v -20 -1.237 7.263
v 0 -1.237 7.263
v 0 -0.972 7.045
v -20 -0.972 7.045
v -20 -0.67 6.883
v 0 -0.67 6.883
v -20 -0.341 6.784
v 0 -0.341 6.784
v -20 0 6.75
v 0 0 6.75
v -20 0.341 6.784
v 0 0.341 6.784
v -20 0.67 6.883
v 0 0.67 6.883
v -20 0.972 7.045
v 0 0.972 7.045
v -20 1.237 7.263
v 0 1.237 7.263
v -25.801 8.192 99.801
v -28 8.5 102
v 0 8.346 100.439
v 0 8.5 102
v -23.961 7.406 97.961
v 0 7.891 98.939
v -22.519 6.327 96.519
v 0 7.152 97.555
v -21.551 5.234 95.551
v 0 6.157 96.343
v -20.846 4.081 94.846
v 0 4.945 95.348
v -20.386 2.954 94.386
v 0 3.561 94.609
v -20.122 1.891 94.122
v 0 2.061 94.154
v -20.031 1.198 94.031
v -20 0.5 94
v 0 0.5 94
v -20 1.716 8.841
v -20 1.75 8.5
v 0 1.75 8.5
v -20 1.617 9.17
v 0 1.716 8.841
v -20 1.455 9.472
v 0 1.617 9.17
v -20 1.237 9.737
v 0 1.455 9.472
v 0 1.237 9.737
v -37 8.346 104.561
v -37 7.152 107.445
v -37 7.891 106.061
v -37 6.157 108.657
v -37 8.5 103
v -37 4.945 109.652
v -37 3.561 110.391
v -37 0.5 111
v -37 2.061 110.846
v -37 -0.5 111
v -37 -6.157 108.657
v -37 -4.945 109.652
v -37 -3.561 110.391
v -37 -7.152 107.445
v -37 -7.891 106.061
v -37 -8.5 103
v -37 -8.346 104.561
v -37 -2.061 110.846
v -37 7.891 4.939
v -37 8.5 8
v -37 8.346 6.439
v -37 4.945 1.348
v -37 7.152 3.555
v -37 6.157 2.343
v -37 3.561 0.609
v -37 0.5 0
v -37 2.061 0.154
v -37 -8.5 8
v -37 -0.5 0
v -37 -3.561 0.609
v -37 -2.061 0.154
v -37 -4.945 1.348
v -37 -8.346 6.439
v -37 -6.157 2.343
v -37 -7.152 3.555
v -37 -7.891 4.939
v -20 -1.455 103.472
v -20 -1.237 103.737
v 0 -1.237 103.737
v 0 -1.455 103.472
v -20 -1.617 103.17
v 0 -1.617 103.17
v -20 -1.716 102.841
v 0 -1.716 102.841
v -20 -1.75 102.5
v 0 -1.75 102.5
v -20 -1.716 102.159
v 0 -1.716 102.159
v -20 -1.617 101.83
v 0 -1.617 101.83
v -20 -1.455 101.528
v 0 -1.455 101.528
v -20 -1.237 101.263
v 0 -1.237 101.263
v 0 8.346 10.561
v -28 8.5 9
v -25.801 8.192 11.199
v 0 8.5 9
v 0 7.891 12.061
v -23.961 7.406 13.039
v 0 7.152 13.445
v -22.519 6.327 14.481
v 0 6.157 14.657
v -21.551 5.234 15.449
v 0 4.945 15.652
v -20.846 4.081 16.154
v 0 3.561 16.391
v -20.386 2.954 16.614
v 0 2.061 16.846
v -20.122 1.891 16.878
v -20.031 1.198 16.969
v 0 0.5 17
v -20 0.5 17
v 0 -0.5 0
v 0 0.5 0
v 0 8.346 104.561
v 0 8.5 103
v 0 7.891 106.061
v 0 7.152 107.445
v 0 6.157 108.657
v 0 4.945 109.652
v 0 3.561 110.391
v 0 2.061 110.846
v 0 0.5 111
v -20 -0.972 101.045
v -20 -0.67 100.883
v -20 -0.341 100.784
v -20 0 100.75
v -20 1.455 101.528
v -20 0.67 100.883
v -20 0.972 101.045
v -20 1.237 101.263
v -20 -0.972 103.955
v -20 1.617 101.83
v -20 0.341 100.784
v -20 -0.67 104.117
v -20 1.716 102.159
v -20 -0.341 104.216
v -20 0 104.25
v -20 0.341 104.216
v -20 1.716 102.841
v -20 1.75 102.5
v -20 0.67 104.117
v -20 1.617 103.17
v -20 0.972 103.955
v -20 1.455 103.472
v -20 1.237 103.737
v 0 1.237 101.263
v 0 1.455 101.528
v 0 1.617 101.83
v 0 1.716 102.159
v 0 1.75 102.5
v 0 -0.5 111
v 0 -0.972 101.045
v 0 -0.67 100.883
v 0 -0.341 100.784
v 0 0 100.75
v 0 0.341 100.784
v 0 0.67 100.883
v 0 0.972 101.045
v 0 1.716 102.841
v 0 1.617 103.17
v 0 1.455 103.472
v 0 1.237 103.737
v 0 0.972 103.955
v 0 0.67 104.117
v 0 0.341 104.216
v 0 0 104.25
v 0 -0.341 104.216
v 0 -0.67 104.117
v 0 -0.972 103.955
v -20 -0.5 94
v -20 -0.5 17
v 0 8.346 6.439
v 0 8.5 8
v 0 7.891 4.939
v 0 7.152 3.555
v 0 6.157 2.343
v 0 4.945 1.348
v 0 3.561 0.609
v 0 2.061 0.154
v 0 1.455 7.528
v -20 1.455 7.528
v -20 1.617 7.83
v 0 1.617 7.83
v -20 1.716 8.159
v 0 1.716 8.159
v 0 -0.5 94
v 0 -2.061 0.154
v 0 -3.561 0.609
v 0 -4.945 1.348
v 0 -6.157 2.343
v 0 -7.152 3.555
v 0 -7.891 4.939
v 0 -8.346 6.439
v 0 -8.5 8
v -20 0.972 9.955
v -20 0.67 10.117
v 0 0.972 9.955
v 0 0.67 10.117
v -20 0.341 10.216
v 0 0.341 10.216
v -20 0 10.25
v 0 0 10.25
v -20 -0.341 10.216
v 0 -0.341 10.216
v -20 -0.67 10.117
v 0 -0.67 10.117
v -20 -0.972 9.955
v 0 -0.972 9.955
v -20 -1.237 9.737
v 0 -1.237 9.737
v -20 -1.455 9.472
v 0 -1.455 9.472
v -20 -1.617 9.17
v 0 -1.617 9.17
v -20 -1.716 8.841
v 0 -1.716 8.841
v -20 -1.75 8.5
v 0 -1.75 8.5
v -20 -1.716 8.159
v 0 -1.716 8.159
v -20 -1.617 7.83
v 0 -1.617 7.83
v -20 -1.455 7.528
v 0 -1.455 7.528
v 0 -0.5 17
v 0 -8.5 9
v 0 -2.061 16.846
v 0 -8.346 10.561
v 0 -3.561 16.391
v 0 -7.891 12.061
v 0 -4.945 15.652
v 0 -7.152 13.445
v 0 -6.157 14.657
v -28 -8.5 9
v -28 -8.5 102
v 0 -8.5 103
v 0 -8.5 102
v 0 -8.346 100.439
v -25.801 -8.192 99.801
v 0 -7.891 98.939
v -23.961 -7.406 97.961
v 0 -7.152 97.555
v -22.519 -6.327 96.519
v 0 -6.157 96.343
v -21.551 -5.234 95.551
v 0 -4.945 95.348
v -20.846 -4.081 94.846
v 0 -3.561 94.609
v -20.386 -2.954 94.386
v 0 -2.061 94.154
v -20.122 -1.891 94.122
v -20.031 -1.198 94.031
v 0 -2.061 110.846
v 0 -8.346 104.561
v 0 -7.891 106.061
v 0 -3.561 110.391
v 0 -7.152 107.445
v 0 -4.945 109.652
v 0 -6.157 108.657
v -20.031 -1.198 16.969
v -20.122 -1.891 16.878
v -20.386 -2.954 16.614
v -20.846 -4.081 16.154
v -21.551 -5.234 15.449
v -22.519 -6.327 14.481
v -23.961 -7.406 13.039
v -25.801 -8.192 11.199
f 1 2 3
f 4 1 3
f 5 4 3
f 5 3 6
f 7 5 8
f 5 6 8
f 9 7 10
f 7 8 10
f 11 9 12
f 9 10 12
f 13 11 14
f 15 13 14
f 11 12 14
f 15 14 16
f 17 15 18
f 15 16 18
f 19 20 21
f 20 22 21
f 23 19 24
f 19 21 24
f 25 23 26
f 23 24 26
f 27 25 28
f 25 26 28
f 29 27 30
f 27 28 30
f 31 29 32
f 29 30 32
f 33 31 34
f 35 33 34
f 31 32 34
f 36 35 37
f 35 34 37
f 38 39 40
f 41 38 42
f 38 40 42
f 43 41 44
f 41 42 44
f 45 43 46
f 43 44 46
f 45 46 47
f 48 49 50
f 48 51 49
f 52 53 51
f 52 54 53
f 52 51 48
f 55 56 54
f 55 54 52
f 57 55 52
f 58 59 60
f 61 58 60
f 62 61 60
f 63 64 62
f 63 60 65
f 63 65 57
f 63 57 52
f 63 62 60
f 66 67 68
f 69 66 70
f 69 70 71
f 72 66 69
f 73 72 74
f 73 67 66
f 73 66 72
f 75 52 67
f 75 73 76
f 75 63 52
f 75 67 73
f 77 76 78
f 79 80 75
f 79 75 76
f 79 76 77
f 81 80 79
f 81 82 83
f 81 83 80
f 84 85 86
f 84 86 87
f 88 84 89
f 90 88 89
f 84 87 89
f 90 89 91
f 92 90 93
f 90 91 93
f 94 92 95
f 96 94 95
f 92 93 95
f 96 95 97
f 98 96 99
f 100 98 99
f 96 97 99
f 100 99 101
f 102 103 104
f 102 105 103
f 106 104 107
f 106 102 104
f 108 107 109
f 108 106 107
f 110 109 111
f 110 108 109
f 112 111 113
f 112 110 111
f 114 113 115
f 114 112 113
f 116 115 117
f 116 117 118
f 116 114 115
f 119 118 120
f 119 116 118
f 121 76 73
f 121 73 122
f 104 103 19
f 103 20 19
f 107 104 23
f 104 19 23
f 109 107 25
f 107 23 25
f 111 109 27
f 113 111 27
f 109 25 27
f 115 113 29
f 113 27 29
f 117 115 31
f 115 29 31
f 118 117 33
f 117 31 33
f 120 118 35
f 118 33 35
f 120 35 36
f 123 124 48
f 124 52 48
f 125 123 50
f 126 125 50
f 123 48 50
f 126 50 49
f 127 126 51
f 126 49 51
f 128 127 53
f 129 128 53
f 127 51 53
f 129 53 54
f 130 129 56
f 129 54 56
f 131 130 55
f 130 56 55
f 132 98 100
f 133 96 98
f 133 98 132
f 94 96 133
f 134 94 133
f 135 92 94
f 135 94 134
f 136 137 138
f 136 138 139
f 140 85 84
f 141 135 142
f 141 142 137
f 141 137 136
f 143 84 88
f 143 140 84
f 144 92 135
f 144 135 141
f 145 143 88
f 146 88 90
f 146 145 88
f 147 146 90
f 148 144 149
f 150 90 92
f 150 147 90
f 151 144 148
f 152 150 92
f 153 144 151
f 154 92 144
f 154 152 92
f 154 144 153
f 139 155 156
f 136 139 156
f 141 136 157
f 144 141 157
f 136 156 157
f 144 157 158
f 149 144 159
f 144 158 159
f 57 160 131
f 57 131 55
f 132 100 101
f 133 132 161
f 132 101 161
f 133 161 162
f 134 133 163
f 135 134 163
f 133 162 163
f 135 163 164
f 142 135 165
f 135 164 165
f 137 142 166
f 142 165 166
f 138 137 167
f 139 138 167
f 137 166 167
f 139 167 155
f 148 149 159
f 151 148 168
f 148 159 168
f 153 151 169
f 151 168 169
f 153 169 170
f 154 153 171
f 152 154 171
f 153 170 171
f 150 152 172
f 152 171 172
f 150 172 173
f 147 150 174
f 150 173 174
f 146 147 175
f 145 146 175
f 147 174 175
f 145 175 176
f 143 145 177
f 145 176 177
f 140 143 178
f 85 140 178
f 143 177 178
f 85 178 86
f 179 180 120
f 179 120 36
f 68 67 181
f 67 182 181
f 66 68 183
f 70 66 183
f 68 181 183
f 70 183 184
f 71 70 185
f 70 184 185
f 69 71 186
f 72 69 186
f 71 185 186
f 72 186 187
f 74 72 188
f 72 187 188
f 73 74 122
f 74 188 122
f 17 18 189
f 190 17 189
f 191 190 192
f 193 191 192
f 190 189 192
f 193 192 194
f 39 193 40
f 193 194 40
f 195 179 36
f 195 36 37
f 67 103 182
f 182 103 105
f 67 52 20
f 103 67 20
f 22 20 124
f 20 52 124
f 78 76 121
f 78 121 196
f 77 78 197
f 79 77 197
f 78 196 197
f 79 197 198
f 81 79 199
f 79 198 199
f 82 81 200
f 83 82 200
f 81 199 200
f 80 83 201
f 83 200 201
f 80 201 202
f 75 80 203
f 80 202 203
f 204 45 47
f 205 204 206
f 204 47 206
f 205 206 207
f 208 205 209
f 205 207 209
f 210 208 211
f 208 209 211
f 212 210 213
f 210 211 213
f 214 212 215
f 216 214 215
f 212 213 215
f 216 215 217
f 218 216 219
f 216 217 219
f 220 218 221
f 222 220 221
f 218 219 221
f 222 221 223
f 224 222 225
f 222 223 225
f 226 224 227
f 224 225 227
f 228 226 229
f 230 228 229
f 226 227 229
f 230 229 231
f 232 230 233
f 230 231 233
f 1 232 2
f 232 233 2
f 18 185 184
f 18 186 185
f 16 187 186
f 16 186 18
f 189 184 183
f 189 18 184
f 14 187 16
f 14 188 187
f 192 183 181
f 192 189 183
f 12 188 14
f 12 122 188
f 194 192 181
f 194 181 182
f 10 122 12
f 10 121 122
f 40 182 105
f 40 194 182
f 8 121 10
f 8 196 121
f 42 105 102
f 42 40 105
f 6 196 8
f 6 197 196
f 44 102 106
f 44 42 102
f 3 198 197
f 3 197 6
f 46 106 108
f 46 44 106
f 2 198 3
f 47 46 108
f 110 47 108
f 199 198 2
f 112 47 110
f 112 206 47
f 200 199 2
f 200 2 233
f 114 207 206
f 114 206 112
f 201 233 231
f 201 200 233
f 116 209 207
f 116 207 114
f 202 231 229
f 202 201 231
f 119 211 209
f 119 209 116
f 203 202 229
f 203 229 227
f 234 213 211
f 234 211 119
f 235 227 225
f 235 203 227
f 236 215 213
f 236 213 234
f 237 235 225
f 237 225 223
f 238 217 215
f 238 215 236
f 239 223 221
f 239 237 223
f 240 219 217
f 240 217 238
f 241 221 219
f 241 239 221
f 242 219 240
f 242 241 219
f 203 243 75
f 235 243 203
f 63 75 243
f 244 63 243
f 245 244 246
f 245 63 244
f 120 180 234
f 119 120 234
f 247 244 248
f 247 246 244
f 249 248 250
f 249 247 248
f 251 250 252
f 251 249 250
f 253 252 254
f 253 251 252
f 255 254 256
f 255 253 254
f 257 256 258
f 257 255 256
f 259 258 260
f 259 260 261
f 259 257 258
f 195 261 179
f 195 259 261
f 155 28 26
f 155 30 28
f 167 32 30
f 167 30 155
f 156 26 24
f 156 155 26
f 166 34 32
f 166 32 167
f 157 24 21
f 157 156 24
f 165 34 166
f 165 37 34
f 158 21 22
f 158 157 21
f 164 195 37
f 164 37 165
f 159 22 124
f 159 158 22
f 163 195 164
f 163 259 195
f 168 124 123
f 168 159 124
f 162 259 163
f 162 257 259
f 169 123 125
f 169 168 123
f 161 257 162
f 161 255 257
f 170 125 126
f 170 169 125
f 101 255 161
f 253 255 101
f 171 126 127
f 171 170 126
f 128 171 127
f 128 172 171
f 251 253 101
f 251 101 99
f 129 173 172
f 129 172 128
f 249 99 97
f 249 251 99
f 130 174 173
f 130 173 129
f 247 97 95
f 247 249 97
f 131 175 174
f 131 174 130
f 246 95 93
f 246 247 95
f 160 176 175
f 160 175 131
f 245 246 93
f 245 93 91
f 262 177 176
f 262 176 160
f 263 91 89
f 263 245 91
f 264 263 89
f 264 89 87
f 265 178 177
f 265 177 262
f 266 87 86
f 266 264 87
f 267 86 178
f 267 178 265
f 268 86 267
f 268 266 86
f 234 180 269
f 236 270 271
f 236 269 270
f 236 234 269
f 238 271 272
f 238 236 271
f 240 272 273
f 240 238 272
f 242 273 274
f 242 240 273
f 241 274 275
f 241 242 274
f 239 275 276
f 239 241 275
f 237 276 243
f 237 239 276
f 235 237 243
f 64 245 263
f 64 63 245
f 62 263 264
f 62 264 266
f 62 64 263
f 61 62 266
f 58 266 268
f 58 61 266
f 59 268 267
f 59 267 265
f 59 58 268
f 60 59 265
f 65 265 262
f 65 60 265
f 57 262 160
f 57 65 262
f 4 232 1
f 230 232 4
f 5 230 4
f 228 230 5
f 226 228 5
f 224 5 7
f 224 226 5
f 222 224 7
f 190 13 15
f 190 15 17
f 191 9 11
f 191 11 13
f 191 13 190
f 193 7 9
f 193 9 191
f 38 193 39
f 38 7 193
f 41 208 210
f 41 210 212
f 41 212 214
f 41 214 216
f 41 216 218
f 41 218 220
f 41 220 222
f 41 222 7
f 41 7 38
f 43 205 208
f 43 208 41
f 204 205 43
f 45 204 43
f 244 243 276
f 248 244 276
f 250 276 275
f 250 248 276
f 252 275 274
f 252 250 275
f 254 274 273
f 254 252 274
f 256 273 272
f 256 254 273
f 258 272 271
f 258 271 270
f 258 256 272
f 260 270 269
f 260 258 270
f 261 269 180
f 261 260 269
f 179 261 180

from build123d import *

# Parameters (mm, degrees)
F0_W     = 20
F0_H     = 17
F0_W_2   = 17
F0_H_2   = 77
F1_DEPTH = 8.5
F3_DEPTH = 20
F4_DEPTH = 20
F5_R     = 8


with BuildPart() as f1:
    # F0 (on Front) → F1 (new body, symmetric)
    with BuildSketch(Plane.XZ):
        with Locations((-10, 8.5)):
            Rectangle(F0_W, F0_H)
        Polygon((-37, 0), (-20, 0), (-20, 17), (-28.5, 8.5), align=None)
        with Locations((-28.5, 55.5)):
            Rectangle(F0_W_2, F0_H_2)
        Polygon((-28.5, 8.5), (-20, 17), (-37, 17), align=None)
        Polygon((-37, 17), (-37, 0), (-28.5, 8.5), align=None)
        Polygon((-37, 94), (-20, 94), (-20, 111), (-28.5, 102.5), align=None)
        with Locations((-10, 102.5)):
            Rectangle(F0_W, F0_H)
        Polygon((-28.5, 102.5), (-20, 111), (-37, 111), align=None)
        Polygon((-37, 111), (-37, 94), (-28.5, 102.5), align=None)
    extrude(amount=F1_DEPTH, both=True)

    # F2 (on face) → F3 (cut)
    with BuildSketch(Plane.YZ):
        with BuildLine():
            ThreePointArc((1.75, 102.5), (0.6696960066, 104.1167891819), (-1.2374368671, 103.7374368671))
            Line((-1.2374368671, 103.7374368671), (0, 102.5))
            Line((0, 102.5), (1.2374368671, 101.2625631329))
            ThreePointArc((1.2374368671, 101.2625631329), (1.6167891819, 101.8303039934), (1.75, 102.5))
        make_face()
        with BuildLine():
            Line((1.2374368671, 101.2625631329), (0, 102.5))
            Line((0, 102.5), (-1.2374368671, 101.2625631329))
            ThreePointArc((-1.2374368671, 101.2625631329), (0, 100.75), (1.2374368671, 101.2625631329))
        make_face()
        with BuildLine():
            Line((0, 102.5), (-1.2374368671, 103.7374368671))
            ThreePointArc((-1.2374368671, 103.7374368671), (-1.75, 102.5), (-1.2374368671, 101.2625631329))
            Line((-1.2374368671, 101.2625631329), (0, 102.5))
        make_face()
    extrude(amount=-F3_DEPTH, mode=Mode.SUBTRACT)

    # F2 (on face) → F4 (cut)
    with BuildSketch(Plane.YZ):
        with BuildLine():
            Line((0, 8.5), (-1.2374368671, 7.2625631329))
            ThreePointArc((-1.2374368671, 7.2625631329), (0, 6.75), (1.2374368671, 7.2625631329))
            Line((1.2374368671, 7.2625631329), (0, 8.5))
        make_face()
        with BuildLine():
            Line((1.2374368671, 9.7374368671), (0, 8.5))
            Line((0, 8.5), (1.2374368671, 7.2625631329))
            ThreePointArc((1.2374368671, 7.2625631329), (1.6167891819, 7.8303039934), (1.75, 8.5))
            ThreePointArc((1.75, 8.5), (1.6167891819, 9.1696960066), (1.2374368671, 9.7374368671))
        make_face()
        with BuildLine():
            ThreePointArc((1.2374368671, 9.7374368671), (-1.2374368671, 9.7374368671), (-1.2374368671, 7.2625631329))
            Line((-1.2374368671, 7.2625631329), (0, 8.5))
            Line((0, 8.5), (1.2374368671, 9.7374368671))
        make_face()
    extrude(amount=-F4_DEPTH, mode=Mode.SUBTRACT)

    # F5
    f5_edges = [f1.edges().sort_by_distance(p)[0] for p in [
        (-20, 8.5, 55.5),
        (-20, -8.5, 55.5),
        (-10, 8.5, 94),
        (-10, -8.5, 94),
        (-10, -8.5, 17),
        (-10, 8.5, 17),
        (-18.5, -8.5, 0),
        (-18.5, 8.5, 0),
        (-18.5, -8.5, 111),
        (-18.5, 8.5, 111),
    ]]
    fillet(f5_edges, radius=F5_R)


solid = f1.part
